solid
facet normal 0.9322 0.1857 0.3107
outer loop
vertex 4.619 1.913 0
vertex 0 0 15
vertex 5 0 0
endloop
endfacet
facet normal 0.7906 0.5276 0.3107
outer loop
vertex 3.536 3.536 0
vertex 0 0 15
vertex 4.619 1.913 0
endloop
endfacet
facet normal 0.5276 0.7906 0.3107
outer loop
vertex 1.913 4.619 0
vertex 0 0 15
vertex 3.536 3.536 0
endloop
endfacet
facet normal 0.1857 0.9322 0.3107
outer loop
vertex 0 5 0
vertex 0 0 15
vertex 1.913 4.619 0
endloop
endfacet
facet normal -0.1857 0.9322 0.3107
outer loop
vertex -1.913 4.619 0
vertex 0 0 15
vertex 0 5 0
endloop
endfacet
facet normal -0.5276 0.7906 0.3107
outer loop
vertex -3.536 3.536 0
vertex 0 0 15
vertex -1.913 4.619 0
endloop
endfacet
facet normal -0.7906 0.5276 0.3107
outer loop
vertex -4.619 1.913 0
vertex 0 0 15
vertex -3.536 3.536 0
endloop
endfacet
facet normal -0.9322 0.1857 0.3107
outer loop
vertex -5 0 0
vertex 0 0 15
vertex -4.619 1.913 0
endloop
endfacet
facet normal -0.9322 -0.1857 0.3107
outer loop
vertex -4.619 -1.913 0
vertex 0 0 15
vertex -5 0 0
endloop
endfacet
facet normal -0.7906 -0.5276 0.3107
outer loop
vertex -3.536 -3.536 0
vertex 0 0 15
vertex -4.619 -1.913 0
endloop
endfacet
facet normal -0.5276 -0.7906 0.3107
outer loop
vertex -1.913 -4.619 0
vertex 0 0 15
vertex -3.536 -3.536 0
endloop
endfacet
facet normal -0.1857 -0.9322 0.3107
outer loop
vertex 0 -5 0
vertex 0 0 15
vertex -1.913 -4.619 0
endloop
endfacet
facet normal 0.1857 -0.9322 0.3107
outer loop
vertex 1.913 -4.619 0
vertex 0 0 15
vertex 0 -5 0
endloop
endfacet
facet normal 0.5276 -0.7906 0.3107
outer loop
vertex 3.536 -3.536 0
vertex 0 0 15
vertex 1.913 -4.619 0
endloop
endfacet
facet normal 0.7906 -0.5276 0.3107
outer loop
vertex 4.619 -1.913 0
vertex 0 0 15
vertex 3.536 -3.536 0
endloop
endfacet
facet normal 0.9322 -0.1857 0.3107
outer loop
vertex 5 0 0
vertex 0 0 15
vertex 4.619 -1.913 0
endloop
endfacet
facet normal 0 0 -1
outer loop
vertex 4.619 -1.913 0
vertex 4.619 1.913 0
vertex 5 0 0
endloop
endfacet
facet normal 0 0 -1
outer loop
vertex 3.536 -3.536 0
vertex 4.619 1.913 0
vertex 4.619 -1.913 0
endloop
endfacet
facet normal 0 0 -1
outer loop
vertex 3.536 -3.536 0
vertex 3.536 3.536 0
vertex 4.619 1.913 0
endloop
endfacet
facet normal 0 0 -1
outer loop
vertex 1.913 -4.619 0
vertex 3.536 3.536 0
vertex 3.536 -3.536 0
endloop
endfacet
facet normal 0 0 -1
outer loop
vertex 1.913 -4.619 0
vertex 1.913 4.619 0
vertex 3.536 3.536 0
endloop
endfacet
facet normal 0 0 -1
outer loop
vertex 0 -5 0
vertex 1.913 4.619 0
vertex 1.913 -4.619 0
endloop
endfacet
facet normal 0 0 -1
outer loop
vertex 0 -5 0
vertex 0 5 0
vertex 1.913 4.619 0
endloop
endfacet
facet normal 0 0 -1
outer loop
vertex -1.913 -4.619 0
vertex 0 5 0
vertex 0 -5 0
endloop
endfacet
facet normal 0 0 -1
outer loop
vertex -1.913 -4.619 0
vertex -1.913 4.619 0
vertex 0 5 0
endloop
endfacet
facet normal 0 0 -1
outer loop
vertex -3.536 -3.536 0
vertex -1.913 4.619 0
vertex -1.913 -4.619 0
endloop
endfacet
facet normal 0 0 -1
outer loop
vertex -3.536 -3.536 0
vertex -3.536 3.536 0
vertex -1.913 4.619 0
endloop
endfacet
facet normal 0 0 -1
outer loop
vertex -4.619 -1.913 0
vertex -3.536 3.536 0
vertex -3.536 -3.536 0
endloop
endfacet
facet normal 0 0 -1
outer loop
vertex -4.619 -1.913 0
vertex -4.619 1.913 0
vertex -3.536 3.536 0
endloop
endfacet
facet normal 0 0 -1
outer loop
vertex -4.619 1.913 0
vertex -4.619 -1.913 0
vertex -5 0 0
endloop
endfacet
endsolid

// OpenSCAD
// Generated by SolidPython 1.0.1 on 2020-07-29 00:46:43


cylinder(h = 15, r1 = 5, r2 = 0);
/***********************************************
*********      SolidPython code:      **********
************************************************
 
# import packages: SolidPython
from solid import *
from solid.utils import *
from itertools import chain, combinations, permutations


class Resize:

    def __init__(self, scad_file):
        self.scad_file = scad_file
        #self.scad_file = import_scad(scad_file)
        # cone/cylinder param:
        self.r1 = 0
        self.r2 = 0
        self.h = 0
        # rectangular prism param:
        self.w = 0
        self.l = 0
        # ellipse param:
        self.r = 0

    # import OpenScad code (file name corresponds to shape)


    # classify shape + parameters
    def assign(self, param1, param2, param3):
        if self.scad_file == 'cone.scad':
            self.r1 = param1
            self.r2 = param2
            self.h = param3
        elif self.scad_file == 'cylinder.scad':
            self.r1 = param1
            self.r2 = param2
            self.h = param3
        elif self.scad_file == 'rectangularPrism.scad':
            self.h = param1
            self.l = param2
            self.w = param3
        else:
            self.r = param1
            self.h = param2

    # resize parameters
    def iterate(self):
        x = range(3, 20, 2)
        i = 1
        if self.scad_file == 'cone.scad':
            tempList = list(permutations(x, 2))
            for temp in tempList:
                param1 = temp[0]
                param2 = temp[1]
                filepath = 'produced_scad_files/' + 'cone' + str(param1) + '_' + str(param2) + '_' + '.scad'
                scad_render_to_file(cylinder(h=param1, r1=param2, r2=0), filepath)

        elif self.scad_file == 'cylinder.scad':
            tempList = list(permutations(x, 3))
            for temp in tempList:
                param1 = temp[0]
                param2 = temp[1]
                filepath = 'produced_scad_files/' + 'cylinder' + str(param1) + '_' + str(param2) + '_' + '.scad'
                scad_render_to_file(cylinder(h=param1, r1=param2, r2=param2), filepath)

        elif self.scad_file == 'rectangularPrism.scad':
            tempList = list(permutations(x, 3))
            for temp in tempList:
                param1 = temp[0]
                param2 = temp[1]
                param3 = temp[2]
                filepath = 'produced_scad_files/' + 'rectangularPrism' + str(param1) + '_' + str(param2) + '_' + str(
                    param3) + '.scad'
                scad_render_to_file(cube(size=(param1, param2, param3)), filepath)

        elif self.scad_file == 'ellipse.scad':
            tempList = list(permutations(x, 4))
            for temp in tempList:
                param1 = temp[0]
                param2 = temp[1]
                param3 = temp[2]
                param4 = temp[3]
                filepath = 'produced_scad_files/' + 'ellipse' + str(param1) + '_' + str(param2) + '_' + str(param3) + '_' + str(param4) + '.scad'
                scad_render_to_file(scale([param1, param2, param3])(sphere(r=param4)), filepath)

    def render_to_scadfile(self):
        scad_render_to_file(scad, 'example.scad') 
 
************************************************/
